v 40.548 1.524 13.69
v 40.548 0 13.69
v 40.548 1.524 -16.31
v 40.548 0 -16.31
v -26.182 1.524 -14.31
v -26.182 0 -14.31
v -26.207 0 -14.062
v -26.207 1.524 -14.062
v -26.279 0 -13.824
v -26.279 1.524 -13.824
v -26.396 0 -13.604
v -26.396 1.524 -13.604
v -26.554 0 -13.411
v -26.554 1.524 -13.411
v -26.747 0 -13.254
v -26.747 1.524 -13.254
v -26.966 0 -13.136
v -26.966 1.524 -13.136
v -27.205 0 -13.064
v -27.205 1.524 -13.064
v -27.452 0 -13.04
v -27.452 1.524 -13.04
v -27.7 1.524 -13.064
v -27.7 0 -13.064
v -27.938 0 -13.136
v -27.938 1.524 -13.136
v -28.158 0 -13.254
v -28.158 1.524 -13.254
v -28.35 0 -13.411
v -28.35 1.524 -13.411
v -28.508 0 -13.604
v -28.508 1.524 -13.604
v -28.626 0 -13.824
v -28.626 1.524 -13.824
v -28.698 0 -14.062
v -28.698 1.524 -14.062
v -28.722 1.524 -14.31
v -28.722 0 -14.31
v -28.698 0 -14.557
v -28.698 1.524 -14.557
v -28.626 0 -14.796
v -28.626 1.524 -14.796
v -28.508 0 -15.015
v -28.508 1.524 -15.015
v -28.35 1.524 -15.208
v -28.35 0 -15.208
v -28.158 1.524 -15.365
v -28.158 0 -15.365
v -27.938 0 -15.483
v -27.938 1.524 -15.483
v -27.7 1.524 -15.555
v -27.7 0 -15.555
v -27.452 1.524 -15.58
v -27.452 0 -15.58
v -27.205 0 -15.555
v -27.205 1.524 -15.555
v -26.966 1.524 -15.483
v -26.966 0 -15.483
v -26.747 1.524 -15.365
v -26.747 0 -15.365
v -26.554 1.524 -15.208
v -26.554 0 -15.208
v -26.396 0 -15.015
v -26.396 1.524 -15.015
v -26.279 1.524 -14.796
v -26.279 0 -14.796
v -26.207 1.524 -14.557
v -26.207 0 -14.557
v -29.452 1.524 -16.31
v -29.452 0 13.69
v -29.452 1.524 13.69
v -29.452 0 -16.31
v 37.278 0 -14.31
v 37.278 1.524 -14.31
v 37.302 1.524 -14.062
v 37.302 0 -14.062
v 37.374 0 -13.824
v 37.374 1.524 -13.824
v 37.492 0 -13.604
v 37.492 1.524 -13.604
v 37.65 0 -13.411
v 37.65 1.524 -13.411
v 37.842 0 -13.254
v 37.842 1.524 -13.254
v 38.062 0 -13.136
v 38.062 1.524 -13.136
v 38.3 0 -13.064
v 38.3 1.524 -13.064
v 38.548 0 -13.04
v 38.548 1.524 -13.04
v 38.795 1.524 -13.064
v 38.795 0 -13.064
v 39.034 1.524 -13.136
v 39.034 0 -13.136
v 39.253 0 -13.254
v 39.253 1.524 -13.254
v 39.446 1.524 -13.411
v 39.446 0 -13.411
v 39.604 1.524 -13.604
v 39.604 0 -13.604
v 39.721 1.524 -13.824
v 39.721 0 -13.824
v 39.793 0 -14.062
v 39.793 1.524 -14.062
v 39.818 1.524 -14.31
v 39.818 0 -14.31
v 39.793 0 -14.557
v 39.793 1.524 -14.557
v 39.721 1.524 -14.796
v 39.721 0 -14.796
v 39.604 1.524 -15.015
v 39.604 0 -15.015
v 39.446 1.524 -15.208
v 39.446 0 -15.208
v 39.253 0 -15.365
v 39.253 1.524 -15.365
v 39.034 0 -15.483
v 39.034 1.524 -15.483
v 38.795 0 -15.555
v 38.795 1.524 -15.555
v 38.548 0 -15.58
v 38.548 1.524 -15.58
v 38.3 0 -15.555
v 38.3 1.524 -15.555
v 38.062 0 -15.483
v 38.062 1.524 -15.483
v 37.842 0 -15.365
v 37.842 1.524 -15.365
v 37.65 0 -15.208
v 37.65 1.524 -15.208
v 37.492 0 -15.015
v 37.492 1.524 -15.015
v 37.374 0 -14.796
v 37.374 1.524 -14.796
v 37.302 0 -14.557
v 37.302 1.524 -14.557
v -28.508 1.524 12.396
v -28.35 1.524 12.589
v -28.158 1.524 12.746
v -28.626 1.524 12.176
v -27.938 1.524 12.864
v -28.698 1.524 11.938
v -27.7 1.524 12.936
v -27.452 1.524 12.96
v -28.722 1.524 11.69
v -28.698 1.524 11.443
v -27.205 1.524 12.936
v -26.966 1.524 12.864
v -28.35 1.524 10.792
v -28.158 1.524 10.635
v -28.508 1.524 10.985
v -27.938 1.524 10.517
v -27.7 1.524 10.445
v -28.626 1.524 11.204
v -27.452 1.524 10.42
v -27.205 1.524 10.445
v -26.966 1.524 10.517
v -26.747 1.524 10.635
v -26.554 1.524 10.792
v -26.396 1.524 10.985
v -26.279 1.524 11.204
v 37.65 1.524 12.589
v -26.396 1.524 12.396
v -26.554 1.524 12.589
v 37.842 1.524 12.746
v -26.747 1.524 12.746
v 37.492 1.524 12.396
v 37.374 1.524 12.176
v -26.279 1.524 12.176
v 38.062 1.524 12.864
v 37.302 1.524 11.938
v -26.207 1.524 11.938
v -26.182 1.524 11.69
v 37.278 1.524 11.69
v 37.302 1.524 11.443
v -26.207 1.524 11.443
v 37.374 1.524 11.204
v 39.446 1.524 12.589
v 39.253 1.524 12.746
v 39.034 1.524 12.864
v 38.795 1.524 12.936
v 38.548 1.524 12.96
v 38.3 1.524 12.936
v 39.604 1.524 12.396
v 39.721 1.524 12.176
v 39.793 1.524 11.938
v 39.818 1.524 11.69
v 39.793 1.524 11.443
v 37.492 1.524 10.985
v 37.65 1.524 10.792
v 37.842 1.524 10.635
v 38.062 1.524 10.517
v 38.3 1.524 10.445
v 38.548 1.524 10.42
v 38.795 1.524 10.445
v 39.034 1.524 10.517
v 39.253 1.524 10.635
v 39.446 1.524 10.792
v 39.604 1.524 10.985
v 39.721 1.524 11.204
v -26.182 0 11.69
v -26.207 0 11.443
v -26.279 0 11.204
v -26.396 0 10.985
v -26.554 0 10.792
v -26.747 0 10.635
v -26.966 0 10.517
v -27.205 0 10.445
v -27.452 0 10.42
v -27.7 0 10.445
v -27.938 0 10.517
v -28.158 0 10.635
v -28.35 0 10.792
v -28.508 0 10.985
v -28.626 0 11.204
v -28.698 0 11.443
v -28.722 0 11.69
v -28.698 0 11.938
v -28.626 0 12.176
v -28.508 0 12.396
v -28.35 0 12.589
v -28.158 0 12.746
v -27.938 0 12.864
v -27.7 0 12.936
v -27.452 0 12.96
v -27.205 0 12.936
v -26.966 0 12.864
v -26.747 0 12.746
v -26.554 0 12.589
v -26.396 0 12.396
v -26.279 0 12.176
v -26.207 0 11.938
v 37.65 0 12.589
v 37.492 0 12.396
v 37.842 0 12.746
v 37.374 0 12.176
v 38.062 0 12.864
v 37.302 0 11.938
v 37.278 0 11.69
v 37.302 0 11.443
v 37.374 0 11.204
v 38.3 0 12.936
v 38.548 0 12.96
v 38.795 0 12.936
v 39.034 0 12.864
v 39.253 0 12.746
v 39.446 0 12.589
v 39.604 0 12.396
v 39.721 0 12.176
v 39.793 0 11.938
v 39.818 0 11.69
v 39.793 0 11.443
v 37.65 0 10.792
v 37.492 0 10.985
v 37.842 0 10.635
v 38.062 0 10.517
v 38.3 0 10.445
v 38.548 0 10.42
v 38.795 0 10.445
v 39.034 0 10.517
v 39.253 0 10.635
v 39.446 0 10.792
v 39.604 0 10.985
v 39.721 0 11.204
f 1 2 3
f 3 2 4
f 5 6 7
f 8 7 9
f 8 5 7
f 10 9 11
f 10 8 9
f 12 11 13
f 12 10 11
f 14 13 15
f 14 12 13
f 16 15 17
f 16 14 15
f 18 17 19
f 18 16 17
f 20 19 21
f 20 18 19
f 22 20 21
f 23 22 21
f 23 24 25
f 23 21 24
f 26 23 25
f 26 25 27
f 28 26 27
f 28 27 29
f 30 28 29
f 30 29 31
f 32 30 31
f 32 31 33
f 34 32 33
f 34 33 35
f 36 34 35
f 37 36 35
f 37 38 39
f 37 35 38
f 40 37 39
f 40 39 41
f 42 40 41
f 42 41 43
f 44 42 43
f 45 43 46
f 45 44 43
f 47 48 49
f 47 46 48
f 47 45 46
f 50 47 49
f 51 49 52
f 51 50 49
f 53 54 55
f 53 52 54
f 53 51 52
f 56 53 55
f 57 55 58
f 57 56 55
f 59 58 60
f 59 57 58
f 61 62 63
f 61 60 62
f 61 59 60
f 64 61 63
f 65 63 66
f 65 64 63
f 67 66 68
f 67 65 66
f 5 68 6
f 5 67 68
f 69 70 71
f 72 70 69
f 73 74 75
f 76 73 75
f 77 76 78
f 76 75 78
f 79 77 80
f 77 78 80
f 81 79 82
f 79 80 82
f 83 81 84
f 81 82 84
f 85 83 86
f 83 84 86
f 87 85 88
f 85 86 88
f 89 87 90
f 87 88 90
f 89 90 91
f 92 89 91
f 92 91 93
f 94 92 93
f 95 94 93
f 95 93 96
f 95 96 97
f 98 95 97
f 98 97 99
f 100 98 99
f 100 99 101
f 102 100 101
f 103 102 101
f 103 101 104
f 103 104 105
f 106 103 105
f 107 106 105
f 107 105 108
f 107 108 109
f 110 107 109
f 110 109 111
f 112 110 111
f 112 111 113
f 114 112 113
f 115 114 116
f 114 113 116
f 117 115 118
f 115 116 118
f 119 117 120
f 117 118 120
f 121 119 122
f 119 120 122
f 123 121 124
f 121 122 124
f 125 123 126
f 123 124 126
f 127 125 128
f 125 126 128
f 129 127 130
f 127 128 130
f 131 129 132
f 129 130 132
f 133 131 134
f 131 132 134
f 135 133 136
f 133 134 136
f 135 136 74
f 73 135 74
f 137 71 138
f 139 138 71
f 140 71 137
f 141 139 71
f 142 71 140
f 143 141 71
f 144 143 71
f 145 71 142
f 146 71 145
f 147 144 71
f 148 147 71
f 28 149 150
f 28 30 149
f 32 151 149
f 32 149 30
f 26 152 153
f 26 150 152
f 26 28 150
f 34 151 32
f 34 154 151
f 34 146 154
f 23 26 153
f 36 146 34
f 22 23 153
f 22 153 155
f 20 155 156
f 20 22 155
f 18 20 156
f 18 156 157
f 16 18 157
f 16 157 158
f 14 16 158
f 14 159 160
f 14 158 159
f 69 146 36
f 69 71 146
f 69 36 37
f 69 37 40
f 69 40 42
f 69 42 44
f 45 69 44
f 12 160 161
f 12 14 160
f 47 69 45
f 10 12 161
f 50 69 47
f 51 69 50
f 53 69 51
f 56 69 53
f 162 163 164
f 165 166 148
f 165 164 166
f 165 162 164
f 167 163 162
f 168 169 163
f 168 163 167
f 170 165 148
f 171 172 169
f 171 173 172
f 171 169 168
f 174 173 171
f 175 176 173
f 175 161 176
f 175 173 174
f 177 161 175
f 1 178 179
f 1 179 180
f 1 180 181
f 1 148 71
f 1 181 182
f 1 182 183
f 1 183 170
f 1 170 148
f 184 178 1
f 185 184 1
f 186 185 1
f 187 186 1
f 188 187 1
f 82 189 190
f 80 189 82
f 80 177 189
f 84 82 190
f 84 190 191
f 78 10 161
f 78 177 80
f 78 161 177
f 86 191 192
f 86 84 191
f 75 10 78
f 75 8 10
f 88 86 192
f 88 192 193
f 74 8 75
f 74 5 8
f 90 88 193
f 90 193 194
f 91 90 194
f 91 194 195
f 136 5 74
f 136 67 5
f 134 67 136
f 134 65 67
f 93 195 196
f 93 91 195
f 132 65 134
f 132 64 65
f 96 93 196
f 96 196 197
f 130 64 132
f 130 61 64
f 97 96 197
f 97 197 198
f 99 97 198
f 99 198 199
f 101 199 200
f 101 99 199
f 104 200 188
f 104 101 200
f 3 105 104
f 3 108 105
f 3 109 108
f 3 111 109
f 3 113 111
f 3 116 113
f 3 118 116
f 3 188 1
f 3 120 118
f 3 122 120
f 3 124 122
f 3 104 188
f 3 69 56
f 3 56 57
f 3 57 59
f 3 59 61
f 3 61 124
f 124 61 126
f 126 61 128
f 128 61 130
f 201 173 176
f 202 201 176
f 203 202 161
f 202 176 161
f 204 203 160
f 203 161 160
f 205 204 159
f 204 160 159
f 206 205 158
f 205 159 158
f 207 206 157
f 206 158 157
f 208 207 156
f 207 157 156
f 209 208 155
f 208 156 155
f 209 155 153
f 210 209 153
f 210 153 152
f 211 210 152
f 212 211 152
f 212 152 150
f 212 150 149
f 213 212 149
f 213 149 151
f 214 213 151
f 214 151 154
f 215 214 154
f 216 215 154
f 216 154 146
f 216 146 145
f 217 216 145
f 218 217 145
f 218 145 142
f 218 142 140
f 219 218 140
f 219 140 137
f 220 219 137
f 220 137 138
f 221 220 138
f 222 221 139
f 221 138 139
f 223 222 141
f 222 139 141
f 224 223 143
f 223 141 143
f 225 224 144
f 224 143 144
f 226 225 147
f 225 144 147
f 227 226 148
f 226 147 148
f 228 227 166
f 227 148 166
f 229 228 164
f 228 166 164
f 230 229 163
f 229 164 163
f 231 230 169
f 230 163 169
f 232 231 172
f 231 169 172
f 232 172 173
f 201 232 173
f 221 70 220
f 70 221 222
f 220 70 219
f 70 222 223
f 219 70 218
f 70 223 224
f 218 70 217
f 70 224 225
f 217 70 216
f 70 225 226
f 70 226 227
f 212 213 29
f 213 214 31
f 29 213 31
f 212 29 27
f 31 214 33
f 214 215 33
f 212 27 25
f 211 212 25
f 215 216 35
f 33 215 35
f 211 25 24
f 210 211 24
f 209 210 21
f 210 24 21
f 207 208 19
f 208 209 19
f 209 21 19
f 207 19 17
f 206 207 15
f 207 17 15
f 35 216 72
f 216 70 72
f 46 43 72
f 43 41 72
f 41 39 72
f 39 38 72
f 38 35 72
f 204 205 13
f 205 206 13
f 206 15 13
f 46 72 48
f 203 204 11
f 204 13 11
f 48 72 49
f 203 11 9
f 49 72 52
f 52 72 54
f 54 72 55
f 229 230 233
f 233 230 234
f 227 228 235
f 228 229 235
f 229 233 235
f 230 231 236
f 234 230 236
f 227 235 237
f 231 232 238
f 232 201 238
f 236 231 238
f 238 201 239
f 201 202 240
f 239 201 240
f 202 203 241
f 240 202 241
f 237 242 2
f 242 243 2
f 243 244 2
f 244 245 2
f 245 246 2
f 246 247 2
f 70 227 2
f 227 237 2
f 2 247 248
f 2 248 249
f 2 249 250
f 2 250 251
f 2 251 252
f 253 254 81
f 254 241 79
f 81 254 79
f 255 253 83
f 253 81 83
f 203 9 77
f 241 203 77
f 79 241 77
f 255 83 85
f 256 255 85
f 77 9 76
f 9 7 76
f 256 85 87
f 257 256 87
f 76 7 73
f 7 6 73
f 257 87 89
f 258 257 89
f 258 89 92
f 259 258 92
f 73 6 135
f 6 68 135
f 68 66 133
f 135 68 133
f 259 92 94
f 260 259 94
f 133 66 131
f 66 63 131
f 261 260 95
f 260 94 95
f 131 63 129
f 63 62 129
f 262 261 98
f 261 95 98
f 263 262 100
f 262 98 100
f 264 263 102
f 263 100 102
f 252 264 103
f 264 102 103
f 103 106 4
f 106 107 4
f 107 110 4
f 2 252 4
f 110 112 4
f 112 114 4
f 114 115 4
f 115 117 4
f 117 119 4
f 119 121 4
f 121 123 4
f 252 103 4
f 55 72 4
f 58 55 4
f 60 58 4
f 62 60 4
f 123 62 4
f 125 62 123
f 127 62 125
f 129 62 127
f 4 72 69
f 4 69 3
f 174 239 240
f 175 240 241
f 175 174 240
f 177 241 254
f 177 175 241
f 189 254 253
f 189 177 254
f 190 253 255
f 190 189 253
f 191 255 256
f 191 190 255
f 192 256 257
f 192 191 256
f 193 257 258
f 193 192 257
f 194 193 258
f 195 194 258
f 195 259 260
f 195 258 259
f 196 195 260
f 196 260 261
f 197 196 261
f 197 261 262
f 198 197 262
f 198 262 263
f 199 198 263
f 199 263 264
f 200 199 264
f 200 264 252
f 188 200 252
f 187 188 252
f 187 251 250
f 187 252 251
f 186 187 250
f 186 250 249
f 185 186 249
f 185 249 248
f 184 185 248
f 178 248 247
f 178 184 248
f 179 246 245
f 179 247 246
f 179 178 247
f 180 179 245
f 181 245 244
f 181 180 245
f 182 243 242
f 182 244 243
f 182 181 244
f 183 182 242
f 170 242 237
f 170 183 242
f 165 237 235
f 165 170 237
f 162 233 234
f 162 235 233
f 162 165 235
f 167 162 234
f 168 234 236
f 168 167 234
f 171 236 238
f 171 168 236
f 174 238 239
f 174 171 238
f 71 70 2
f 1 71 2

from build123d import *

# Parameters (mm, degrees)
SKETCH1_W               = 70
SKETCH1_H               = 30
BOSS_EXTRUDE1_DEPTH     = 1.524
SKETCH2_R               = 1.27
CUT_EXTRUDE1_DEPTH      = 2.524
MIRROR2_COPY_1_SKETCH_R = 1.27
MIRROR2_COPY_1_DEPTH    = 2.524


with BuildPart() as part:
    # Sketch1 → Boss-Extrude1 (new body)
    with BuildSketch(Plane(origin=(0, 0, 0), x_dir=(1, 0, 0), z_dir=(0, 1, 0))):
        with Locations((5.547619048, 1.30952381)):
            Rectangle(SKETCH1_W, SKETCH1_H)
    extrude(amount=BOSS_EXTRUDE1_DEPTH)

    # Sketch2 → Cut-Extrude1 (cut, through all)
    with BuildSketch(Plane(origin=(0, 1.524, 0), x_dir=(1, 0, 0), z_dir=(0, 1, 0))):
        with Locations((-27.452380952, -11.69047619)):
            Circle(SKETCH2_R)
    cut_extrude1 = extrude(amount=-CUT_EXTRUDE1_DEPTH, mode=Mode.SUBTRACT)

    # Mirror1: Cut-Extrude1 across plane
    add(cut_extrude1.mirror(Plane.ZY.offset(-5.547619048)), mode=Mode.SUBTRACT)

    # Mirror2: Cut-Extrude1 across plane
    add(cut_extrude1.mirror(Plane(origin=(0, 0, -1.30952381), x_dir=(1, 0, 0), z_dir=(0, 0, -1))), mode=Mode.SUBTRACT)

    # Mirror2 copy 1 sketch → Mirror2 copy 1 (cut, through all)
    with BuildSketch(Plane(origin=(11.095238095, 1.524, -2.619047619), x_dir=(-1, 0, 0), z_dir=(0, 1, 0))):
        with Locations((-27.452380952, -11.69047619)):
            Circle(MIRROR2_COPY_1_SKETCH_R)
    extrude(amount=-MIRROR2_COPY_1_DEPTH, mode=Mode.SUBTRACT)


solid = part.part
